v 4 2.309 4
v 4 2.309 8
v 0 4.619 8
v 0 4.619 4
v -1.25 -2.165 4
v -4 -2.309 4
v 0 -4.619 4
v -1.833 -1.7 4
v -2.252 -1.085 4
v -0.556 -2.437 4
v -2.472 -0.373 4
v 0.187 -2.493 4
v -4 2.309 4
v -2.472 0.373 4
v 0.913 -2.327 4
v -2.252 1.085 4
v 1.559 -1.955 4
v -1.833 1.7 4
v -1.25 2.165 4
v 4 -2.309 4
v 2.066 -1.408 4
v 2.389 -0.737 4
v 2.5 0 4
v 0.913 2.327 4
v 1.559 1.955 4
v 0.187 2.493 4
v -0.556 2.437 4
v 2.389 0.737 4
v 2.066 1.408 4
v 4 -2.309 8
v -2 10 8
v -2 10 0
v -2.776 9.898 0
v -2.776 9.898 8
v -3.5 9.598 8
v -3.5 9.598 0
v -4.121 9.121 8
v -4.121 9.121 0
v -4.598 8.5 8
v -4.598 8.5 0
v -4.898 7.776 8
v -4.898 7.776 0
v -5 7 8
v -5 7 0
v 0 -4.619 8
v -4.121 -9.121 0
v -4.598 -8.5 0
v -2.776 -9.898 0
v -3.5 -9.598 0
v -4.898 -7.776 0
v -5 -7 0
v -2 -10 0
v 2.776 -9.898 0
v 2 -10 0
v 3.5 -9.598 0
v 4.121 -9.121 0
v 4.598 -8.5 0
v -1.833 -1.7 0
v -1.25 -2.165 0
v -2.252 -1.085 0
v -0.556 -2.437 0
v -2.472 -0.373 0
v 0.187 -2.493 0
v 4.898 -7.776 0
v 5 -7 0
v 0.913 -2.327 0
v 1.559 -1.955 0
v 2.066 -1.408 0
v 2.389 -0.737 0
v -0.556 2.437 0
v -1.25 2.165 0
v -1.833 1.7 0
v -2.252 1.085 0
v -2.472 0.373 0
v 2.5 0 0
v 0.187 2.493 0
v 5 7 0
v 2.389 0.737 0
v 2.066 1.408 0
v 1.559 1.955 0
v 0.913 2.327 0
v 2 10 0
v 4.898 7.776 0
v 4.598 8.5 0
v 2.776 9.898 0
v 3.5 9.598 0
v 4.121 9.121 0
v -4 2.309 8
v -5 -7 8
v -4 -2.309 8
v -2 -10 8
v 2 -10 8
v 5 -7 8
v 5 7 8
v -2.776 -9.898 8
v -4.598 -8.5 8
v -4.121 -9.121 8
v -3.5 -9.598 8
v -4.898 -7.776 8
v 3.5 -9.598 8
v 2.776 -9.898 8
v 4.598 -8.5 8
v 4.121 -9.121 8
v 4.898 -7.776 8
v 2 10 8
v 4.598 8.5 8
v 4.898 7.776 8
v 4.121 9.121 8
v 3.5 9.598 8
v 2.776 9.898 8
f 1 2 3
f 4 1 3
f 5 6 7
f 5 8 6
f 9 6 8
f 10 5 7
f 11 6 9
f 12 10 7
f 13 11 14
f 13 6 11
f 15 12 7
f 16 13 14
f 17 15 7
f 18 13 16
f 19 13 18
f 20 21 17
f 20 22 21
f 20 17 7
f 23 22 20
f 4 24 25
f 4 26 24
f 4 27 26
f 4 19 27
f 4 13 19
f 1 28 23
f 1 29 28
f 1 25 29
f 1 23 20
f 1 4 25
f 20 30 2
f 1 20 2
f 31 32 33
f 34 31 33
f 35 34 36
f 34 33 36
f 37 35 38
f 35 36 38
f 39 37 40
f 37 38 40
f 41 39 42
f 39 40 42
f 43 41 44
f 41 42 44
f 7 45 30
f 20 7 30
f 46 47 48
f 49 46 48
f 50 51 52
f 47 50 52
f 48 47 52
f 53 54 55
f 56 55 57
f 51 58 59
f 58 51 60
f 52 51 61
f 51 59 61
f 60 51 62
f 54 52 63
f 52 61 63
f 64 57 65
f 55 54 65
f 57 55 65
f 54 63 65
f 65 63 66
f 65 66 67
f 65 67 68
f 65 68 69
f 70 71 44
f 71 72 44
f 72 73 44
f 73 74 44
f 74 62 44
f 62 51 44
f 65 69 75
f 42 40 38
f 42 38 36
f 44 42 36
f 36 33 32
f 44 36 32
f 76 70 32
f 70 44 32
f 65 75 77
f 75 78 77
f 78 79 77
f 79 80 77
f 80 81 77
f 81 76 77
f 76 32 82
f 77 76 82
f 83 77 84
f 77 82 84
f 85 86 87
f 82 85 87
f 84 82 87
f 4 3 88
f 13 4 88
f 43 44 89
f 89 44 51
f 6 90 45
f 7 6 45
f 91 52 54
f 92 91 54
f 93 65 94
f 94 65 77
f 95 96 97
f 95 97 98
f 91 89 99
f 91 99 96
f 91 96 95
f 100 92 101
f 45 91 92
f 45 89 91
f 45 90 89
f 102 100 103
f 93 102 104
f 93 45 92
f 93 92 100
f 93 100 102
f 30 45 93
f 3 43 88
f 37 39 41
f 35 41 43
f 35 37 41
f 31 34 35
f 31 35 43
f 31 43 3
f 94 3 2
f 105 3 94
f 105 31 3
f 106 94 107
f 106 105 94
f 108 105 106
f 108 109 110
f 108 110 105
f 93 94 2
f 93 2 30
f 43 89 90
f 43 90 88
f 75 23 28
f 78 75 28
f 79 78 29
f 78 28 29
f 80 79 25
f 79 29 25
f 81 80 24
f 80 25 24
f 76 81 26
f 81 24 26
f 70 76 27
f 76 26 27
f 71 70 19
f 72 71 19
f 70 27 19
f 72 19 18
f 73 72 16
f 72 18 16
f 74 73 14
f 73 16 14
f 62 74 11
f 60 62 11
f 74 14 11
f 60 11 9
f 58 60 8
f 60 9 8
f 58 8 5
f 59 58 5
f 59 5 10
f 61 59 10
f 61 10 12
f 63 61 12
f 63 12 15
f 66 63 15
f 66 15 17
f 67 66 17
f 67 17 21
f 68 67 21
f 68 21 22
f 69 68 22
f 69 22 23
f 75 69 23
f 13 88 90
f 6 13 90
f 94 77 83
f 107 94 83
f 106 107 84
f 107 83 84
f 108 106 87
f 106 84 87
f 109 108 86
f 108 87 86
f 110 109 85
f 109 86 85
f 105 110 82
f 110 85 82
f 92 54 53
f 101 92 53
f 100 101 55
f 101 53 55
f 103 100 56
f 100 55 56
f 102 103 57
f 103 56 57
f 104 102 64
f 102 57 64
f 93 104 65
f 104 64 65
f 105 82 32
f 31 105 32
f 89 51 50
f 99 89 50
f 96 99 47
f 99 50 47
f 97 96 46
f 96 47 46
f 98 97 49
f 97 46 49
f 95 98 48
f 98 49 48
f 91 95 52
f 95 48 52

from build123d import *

# Parameters (mm, degrees)
F1_DEPTH = 8
F2_R     = 2.5
F3_DEPTH = 25
F5_DEPTH = 4


with BuildPart() as f1:
    # F0 (on Top) → F1 (new body)
    with BuildSketch(Plane.XY):
        with BuildLine():
            Line((-2, -10), (2, -10))
            ThreePointArc((2, -10), (4.12132, -9.12132), (5, -7))
            Line((5, -7), (5, 7))
            ThreePointArc((5, 7), (4.12132, 9.12132), (2, 10))
            Line((2, 10), (-2, 10))
            ThreePointArc((-2, 10), (-4.12132, 9.12132), (-5, 7))
            Line((-5, 7), (-5, -7))
            ThreePointArc((-5, -7), (-4.12132, -9.12132), (-2, -10))
        make_face()
    extrude(amount=F1_DEPTH)

    # F2 (on face) → F3 (cut)
    with BuildSketch(Plane.XY.offset(8)):
        Circle(F2_R)
    extrude(amount=-F3_DEPTH, mode=Mode.SUBTRACT)

    # F4 (on face) → F5 (cut)
    with BuildSketch(Plane.XY.offset(8)):
        Polygon((0, -4.618802), (4, -2.309401), (4, 2.309401), (0, 4.618802), (-4, 2.309401), (-4, -2.309401), align=None)
    extrude(amount=-F5_DEPTH, mode=Mode.SUBTRACT)


solid = f1.part
